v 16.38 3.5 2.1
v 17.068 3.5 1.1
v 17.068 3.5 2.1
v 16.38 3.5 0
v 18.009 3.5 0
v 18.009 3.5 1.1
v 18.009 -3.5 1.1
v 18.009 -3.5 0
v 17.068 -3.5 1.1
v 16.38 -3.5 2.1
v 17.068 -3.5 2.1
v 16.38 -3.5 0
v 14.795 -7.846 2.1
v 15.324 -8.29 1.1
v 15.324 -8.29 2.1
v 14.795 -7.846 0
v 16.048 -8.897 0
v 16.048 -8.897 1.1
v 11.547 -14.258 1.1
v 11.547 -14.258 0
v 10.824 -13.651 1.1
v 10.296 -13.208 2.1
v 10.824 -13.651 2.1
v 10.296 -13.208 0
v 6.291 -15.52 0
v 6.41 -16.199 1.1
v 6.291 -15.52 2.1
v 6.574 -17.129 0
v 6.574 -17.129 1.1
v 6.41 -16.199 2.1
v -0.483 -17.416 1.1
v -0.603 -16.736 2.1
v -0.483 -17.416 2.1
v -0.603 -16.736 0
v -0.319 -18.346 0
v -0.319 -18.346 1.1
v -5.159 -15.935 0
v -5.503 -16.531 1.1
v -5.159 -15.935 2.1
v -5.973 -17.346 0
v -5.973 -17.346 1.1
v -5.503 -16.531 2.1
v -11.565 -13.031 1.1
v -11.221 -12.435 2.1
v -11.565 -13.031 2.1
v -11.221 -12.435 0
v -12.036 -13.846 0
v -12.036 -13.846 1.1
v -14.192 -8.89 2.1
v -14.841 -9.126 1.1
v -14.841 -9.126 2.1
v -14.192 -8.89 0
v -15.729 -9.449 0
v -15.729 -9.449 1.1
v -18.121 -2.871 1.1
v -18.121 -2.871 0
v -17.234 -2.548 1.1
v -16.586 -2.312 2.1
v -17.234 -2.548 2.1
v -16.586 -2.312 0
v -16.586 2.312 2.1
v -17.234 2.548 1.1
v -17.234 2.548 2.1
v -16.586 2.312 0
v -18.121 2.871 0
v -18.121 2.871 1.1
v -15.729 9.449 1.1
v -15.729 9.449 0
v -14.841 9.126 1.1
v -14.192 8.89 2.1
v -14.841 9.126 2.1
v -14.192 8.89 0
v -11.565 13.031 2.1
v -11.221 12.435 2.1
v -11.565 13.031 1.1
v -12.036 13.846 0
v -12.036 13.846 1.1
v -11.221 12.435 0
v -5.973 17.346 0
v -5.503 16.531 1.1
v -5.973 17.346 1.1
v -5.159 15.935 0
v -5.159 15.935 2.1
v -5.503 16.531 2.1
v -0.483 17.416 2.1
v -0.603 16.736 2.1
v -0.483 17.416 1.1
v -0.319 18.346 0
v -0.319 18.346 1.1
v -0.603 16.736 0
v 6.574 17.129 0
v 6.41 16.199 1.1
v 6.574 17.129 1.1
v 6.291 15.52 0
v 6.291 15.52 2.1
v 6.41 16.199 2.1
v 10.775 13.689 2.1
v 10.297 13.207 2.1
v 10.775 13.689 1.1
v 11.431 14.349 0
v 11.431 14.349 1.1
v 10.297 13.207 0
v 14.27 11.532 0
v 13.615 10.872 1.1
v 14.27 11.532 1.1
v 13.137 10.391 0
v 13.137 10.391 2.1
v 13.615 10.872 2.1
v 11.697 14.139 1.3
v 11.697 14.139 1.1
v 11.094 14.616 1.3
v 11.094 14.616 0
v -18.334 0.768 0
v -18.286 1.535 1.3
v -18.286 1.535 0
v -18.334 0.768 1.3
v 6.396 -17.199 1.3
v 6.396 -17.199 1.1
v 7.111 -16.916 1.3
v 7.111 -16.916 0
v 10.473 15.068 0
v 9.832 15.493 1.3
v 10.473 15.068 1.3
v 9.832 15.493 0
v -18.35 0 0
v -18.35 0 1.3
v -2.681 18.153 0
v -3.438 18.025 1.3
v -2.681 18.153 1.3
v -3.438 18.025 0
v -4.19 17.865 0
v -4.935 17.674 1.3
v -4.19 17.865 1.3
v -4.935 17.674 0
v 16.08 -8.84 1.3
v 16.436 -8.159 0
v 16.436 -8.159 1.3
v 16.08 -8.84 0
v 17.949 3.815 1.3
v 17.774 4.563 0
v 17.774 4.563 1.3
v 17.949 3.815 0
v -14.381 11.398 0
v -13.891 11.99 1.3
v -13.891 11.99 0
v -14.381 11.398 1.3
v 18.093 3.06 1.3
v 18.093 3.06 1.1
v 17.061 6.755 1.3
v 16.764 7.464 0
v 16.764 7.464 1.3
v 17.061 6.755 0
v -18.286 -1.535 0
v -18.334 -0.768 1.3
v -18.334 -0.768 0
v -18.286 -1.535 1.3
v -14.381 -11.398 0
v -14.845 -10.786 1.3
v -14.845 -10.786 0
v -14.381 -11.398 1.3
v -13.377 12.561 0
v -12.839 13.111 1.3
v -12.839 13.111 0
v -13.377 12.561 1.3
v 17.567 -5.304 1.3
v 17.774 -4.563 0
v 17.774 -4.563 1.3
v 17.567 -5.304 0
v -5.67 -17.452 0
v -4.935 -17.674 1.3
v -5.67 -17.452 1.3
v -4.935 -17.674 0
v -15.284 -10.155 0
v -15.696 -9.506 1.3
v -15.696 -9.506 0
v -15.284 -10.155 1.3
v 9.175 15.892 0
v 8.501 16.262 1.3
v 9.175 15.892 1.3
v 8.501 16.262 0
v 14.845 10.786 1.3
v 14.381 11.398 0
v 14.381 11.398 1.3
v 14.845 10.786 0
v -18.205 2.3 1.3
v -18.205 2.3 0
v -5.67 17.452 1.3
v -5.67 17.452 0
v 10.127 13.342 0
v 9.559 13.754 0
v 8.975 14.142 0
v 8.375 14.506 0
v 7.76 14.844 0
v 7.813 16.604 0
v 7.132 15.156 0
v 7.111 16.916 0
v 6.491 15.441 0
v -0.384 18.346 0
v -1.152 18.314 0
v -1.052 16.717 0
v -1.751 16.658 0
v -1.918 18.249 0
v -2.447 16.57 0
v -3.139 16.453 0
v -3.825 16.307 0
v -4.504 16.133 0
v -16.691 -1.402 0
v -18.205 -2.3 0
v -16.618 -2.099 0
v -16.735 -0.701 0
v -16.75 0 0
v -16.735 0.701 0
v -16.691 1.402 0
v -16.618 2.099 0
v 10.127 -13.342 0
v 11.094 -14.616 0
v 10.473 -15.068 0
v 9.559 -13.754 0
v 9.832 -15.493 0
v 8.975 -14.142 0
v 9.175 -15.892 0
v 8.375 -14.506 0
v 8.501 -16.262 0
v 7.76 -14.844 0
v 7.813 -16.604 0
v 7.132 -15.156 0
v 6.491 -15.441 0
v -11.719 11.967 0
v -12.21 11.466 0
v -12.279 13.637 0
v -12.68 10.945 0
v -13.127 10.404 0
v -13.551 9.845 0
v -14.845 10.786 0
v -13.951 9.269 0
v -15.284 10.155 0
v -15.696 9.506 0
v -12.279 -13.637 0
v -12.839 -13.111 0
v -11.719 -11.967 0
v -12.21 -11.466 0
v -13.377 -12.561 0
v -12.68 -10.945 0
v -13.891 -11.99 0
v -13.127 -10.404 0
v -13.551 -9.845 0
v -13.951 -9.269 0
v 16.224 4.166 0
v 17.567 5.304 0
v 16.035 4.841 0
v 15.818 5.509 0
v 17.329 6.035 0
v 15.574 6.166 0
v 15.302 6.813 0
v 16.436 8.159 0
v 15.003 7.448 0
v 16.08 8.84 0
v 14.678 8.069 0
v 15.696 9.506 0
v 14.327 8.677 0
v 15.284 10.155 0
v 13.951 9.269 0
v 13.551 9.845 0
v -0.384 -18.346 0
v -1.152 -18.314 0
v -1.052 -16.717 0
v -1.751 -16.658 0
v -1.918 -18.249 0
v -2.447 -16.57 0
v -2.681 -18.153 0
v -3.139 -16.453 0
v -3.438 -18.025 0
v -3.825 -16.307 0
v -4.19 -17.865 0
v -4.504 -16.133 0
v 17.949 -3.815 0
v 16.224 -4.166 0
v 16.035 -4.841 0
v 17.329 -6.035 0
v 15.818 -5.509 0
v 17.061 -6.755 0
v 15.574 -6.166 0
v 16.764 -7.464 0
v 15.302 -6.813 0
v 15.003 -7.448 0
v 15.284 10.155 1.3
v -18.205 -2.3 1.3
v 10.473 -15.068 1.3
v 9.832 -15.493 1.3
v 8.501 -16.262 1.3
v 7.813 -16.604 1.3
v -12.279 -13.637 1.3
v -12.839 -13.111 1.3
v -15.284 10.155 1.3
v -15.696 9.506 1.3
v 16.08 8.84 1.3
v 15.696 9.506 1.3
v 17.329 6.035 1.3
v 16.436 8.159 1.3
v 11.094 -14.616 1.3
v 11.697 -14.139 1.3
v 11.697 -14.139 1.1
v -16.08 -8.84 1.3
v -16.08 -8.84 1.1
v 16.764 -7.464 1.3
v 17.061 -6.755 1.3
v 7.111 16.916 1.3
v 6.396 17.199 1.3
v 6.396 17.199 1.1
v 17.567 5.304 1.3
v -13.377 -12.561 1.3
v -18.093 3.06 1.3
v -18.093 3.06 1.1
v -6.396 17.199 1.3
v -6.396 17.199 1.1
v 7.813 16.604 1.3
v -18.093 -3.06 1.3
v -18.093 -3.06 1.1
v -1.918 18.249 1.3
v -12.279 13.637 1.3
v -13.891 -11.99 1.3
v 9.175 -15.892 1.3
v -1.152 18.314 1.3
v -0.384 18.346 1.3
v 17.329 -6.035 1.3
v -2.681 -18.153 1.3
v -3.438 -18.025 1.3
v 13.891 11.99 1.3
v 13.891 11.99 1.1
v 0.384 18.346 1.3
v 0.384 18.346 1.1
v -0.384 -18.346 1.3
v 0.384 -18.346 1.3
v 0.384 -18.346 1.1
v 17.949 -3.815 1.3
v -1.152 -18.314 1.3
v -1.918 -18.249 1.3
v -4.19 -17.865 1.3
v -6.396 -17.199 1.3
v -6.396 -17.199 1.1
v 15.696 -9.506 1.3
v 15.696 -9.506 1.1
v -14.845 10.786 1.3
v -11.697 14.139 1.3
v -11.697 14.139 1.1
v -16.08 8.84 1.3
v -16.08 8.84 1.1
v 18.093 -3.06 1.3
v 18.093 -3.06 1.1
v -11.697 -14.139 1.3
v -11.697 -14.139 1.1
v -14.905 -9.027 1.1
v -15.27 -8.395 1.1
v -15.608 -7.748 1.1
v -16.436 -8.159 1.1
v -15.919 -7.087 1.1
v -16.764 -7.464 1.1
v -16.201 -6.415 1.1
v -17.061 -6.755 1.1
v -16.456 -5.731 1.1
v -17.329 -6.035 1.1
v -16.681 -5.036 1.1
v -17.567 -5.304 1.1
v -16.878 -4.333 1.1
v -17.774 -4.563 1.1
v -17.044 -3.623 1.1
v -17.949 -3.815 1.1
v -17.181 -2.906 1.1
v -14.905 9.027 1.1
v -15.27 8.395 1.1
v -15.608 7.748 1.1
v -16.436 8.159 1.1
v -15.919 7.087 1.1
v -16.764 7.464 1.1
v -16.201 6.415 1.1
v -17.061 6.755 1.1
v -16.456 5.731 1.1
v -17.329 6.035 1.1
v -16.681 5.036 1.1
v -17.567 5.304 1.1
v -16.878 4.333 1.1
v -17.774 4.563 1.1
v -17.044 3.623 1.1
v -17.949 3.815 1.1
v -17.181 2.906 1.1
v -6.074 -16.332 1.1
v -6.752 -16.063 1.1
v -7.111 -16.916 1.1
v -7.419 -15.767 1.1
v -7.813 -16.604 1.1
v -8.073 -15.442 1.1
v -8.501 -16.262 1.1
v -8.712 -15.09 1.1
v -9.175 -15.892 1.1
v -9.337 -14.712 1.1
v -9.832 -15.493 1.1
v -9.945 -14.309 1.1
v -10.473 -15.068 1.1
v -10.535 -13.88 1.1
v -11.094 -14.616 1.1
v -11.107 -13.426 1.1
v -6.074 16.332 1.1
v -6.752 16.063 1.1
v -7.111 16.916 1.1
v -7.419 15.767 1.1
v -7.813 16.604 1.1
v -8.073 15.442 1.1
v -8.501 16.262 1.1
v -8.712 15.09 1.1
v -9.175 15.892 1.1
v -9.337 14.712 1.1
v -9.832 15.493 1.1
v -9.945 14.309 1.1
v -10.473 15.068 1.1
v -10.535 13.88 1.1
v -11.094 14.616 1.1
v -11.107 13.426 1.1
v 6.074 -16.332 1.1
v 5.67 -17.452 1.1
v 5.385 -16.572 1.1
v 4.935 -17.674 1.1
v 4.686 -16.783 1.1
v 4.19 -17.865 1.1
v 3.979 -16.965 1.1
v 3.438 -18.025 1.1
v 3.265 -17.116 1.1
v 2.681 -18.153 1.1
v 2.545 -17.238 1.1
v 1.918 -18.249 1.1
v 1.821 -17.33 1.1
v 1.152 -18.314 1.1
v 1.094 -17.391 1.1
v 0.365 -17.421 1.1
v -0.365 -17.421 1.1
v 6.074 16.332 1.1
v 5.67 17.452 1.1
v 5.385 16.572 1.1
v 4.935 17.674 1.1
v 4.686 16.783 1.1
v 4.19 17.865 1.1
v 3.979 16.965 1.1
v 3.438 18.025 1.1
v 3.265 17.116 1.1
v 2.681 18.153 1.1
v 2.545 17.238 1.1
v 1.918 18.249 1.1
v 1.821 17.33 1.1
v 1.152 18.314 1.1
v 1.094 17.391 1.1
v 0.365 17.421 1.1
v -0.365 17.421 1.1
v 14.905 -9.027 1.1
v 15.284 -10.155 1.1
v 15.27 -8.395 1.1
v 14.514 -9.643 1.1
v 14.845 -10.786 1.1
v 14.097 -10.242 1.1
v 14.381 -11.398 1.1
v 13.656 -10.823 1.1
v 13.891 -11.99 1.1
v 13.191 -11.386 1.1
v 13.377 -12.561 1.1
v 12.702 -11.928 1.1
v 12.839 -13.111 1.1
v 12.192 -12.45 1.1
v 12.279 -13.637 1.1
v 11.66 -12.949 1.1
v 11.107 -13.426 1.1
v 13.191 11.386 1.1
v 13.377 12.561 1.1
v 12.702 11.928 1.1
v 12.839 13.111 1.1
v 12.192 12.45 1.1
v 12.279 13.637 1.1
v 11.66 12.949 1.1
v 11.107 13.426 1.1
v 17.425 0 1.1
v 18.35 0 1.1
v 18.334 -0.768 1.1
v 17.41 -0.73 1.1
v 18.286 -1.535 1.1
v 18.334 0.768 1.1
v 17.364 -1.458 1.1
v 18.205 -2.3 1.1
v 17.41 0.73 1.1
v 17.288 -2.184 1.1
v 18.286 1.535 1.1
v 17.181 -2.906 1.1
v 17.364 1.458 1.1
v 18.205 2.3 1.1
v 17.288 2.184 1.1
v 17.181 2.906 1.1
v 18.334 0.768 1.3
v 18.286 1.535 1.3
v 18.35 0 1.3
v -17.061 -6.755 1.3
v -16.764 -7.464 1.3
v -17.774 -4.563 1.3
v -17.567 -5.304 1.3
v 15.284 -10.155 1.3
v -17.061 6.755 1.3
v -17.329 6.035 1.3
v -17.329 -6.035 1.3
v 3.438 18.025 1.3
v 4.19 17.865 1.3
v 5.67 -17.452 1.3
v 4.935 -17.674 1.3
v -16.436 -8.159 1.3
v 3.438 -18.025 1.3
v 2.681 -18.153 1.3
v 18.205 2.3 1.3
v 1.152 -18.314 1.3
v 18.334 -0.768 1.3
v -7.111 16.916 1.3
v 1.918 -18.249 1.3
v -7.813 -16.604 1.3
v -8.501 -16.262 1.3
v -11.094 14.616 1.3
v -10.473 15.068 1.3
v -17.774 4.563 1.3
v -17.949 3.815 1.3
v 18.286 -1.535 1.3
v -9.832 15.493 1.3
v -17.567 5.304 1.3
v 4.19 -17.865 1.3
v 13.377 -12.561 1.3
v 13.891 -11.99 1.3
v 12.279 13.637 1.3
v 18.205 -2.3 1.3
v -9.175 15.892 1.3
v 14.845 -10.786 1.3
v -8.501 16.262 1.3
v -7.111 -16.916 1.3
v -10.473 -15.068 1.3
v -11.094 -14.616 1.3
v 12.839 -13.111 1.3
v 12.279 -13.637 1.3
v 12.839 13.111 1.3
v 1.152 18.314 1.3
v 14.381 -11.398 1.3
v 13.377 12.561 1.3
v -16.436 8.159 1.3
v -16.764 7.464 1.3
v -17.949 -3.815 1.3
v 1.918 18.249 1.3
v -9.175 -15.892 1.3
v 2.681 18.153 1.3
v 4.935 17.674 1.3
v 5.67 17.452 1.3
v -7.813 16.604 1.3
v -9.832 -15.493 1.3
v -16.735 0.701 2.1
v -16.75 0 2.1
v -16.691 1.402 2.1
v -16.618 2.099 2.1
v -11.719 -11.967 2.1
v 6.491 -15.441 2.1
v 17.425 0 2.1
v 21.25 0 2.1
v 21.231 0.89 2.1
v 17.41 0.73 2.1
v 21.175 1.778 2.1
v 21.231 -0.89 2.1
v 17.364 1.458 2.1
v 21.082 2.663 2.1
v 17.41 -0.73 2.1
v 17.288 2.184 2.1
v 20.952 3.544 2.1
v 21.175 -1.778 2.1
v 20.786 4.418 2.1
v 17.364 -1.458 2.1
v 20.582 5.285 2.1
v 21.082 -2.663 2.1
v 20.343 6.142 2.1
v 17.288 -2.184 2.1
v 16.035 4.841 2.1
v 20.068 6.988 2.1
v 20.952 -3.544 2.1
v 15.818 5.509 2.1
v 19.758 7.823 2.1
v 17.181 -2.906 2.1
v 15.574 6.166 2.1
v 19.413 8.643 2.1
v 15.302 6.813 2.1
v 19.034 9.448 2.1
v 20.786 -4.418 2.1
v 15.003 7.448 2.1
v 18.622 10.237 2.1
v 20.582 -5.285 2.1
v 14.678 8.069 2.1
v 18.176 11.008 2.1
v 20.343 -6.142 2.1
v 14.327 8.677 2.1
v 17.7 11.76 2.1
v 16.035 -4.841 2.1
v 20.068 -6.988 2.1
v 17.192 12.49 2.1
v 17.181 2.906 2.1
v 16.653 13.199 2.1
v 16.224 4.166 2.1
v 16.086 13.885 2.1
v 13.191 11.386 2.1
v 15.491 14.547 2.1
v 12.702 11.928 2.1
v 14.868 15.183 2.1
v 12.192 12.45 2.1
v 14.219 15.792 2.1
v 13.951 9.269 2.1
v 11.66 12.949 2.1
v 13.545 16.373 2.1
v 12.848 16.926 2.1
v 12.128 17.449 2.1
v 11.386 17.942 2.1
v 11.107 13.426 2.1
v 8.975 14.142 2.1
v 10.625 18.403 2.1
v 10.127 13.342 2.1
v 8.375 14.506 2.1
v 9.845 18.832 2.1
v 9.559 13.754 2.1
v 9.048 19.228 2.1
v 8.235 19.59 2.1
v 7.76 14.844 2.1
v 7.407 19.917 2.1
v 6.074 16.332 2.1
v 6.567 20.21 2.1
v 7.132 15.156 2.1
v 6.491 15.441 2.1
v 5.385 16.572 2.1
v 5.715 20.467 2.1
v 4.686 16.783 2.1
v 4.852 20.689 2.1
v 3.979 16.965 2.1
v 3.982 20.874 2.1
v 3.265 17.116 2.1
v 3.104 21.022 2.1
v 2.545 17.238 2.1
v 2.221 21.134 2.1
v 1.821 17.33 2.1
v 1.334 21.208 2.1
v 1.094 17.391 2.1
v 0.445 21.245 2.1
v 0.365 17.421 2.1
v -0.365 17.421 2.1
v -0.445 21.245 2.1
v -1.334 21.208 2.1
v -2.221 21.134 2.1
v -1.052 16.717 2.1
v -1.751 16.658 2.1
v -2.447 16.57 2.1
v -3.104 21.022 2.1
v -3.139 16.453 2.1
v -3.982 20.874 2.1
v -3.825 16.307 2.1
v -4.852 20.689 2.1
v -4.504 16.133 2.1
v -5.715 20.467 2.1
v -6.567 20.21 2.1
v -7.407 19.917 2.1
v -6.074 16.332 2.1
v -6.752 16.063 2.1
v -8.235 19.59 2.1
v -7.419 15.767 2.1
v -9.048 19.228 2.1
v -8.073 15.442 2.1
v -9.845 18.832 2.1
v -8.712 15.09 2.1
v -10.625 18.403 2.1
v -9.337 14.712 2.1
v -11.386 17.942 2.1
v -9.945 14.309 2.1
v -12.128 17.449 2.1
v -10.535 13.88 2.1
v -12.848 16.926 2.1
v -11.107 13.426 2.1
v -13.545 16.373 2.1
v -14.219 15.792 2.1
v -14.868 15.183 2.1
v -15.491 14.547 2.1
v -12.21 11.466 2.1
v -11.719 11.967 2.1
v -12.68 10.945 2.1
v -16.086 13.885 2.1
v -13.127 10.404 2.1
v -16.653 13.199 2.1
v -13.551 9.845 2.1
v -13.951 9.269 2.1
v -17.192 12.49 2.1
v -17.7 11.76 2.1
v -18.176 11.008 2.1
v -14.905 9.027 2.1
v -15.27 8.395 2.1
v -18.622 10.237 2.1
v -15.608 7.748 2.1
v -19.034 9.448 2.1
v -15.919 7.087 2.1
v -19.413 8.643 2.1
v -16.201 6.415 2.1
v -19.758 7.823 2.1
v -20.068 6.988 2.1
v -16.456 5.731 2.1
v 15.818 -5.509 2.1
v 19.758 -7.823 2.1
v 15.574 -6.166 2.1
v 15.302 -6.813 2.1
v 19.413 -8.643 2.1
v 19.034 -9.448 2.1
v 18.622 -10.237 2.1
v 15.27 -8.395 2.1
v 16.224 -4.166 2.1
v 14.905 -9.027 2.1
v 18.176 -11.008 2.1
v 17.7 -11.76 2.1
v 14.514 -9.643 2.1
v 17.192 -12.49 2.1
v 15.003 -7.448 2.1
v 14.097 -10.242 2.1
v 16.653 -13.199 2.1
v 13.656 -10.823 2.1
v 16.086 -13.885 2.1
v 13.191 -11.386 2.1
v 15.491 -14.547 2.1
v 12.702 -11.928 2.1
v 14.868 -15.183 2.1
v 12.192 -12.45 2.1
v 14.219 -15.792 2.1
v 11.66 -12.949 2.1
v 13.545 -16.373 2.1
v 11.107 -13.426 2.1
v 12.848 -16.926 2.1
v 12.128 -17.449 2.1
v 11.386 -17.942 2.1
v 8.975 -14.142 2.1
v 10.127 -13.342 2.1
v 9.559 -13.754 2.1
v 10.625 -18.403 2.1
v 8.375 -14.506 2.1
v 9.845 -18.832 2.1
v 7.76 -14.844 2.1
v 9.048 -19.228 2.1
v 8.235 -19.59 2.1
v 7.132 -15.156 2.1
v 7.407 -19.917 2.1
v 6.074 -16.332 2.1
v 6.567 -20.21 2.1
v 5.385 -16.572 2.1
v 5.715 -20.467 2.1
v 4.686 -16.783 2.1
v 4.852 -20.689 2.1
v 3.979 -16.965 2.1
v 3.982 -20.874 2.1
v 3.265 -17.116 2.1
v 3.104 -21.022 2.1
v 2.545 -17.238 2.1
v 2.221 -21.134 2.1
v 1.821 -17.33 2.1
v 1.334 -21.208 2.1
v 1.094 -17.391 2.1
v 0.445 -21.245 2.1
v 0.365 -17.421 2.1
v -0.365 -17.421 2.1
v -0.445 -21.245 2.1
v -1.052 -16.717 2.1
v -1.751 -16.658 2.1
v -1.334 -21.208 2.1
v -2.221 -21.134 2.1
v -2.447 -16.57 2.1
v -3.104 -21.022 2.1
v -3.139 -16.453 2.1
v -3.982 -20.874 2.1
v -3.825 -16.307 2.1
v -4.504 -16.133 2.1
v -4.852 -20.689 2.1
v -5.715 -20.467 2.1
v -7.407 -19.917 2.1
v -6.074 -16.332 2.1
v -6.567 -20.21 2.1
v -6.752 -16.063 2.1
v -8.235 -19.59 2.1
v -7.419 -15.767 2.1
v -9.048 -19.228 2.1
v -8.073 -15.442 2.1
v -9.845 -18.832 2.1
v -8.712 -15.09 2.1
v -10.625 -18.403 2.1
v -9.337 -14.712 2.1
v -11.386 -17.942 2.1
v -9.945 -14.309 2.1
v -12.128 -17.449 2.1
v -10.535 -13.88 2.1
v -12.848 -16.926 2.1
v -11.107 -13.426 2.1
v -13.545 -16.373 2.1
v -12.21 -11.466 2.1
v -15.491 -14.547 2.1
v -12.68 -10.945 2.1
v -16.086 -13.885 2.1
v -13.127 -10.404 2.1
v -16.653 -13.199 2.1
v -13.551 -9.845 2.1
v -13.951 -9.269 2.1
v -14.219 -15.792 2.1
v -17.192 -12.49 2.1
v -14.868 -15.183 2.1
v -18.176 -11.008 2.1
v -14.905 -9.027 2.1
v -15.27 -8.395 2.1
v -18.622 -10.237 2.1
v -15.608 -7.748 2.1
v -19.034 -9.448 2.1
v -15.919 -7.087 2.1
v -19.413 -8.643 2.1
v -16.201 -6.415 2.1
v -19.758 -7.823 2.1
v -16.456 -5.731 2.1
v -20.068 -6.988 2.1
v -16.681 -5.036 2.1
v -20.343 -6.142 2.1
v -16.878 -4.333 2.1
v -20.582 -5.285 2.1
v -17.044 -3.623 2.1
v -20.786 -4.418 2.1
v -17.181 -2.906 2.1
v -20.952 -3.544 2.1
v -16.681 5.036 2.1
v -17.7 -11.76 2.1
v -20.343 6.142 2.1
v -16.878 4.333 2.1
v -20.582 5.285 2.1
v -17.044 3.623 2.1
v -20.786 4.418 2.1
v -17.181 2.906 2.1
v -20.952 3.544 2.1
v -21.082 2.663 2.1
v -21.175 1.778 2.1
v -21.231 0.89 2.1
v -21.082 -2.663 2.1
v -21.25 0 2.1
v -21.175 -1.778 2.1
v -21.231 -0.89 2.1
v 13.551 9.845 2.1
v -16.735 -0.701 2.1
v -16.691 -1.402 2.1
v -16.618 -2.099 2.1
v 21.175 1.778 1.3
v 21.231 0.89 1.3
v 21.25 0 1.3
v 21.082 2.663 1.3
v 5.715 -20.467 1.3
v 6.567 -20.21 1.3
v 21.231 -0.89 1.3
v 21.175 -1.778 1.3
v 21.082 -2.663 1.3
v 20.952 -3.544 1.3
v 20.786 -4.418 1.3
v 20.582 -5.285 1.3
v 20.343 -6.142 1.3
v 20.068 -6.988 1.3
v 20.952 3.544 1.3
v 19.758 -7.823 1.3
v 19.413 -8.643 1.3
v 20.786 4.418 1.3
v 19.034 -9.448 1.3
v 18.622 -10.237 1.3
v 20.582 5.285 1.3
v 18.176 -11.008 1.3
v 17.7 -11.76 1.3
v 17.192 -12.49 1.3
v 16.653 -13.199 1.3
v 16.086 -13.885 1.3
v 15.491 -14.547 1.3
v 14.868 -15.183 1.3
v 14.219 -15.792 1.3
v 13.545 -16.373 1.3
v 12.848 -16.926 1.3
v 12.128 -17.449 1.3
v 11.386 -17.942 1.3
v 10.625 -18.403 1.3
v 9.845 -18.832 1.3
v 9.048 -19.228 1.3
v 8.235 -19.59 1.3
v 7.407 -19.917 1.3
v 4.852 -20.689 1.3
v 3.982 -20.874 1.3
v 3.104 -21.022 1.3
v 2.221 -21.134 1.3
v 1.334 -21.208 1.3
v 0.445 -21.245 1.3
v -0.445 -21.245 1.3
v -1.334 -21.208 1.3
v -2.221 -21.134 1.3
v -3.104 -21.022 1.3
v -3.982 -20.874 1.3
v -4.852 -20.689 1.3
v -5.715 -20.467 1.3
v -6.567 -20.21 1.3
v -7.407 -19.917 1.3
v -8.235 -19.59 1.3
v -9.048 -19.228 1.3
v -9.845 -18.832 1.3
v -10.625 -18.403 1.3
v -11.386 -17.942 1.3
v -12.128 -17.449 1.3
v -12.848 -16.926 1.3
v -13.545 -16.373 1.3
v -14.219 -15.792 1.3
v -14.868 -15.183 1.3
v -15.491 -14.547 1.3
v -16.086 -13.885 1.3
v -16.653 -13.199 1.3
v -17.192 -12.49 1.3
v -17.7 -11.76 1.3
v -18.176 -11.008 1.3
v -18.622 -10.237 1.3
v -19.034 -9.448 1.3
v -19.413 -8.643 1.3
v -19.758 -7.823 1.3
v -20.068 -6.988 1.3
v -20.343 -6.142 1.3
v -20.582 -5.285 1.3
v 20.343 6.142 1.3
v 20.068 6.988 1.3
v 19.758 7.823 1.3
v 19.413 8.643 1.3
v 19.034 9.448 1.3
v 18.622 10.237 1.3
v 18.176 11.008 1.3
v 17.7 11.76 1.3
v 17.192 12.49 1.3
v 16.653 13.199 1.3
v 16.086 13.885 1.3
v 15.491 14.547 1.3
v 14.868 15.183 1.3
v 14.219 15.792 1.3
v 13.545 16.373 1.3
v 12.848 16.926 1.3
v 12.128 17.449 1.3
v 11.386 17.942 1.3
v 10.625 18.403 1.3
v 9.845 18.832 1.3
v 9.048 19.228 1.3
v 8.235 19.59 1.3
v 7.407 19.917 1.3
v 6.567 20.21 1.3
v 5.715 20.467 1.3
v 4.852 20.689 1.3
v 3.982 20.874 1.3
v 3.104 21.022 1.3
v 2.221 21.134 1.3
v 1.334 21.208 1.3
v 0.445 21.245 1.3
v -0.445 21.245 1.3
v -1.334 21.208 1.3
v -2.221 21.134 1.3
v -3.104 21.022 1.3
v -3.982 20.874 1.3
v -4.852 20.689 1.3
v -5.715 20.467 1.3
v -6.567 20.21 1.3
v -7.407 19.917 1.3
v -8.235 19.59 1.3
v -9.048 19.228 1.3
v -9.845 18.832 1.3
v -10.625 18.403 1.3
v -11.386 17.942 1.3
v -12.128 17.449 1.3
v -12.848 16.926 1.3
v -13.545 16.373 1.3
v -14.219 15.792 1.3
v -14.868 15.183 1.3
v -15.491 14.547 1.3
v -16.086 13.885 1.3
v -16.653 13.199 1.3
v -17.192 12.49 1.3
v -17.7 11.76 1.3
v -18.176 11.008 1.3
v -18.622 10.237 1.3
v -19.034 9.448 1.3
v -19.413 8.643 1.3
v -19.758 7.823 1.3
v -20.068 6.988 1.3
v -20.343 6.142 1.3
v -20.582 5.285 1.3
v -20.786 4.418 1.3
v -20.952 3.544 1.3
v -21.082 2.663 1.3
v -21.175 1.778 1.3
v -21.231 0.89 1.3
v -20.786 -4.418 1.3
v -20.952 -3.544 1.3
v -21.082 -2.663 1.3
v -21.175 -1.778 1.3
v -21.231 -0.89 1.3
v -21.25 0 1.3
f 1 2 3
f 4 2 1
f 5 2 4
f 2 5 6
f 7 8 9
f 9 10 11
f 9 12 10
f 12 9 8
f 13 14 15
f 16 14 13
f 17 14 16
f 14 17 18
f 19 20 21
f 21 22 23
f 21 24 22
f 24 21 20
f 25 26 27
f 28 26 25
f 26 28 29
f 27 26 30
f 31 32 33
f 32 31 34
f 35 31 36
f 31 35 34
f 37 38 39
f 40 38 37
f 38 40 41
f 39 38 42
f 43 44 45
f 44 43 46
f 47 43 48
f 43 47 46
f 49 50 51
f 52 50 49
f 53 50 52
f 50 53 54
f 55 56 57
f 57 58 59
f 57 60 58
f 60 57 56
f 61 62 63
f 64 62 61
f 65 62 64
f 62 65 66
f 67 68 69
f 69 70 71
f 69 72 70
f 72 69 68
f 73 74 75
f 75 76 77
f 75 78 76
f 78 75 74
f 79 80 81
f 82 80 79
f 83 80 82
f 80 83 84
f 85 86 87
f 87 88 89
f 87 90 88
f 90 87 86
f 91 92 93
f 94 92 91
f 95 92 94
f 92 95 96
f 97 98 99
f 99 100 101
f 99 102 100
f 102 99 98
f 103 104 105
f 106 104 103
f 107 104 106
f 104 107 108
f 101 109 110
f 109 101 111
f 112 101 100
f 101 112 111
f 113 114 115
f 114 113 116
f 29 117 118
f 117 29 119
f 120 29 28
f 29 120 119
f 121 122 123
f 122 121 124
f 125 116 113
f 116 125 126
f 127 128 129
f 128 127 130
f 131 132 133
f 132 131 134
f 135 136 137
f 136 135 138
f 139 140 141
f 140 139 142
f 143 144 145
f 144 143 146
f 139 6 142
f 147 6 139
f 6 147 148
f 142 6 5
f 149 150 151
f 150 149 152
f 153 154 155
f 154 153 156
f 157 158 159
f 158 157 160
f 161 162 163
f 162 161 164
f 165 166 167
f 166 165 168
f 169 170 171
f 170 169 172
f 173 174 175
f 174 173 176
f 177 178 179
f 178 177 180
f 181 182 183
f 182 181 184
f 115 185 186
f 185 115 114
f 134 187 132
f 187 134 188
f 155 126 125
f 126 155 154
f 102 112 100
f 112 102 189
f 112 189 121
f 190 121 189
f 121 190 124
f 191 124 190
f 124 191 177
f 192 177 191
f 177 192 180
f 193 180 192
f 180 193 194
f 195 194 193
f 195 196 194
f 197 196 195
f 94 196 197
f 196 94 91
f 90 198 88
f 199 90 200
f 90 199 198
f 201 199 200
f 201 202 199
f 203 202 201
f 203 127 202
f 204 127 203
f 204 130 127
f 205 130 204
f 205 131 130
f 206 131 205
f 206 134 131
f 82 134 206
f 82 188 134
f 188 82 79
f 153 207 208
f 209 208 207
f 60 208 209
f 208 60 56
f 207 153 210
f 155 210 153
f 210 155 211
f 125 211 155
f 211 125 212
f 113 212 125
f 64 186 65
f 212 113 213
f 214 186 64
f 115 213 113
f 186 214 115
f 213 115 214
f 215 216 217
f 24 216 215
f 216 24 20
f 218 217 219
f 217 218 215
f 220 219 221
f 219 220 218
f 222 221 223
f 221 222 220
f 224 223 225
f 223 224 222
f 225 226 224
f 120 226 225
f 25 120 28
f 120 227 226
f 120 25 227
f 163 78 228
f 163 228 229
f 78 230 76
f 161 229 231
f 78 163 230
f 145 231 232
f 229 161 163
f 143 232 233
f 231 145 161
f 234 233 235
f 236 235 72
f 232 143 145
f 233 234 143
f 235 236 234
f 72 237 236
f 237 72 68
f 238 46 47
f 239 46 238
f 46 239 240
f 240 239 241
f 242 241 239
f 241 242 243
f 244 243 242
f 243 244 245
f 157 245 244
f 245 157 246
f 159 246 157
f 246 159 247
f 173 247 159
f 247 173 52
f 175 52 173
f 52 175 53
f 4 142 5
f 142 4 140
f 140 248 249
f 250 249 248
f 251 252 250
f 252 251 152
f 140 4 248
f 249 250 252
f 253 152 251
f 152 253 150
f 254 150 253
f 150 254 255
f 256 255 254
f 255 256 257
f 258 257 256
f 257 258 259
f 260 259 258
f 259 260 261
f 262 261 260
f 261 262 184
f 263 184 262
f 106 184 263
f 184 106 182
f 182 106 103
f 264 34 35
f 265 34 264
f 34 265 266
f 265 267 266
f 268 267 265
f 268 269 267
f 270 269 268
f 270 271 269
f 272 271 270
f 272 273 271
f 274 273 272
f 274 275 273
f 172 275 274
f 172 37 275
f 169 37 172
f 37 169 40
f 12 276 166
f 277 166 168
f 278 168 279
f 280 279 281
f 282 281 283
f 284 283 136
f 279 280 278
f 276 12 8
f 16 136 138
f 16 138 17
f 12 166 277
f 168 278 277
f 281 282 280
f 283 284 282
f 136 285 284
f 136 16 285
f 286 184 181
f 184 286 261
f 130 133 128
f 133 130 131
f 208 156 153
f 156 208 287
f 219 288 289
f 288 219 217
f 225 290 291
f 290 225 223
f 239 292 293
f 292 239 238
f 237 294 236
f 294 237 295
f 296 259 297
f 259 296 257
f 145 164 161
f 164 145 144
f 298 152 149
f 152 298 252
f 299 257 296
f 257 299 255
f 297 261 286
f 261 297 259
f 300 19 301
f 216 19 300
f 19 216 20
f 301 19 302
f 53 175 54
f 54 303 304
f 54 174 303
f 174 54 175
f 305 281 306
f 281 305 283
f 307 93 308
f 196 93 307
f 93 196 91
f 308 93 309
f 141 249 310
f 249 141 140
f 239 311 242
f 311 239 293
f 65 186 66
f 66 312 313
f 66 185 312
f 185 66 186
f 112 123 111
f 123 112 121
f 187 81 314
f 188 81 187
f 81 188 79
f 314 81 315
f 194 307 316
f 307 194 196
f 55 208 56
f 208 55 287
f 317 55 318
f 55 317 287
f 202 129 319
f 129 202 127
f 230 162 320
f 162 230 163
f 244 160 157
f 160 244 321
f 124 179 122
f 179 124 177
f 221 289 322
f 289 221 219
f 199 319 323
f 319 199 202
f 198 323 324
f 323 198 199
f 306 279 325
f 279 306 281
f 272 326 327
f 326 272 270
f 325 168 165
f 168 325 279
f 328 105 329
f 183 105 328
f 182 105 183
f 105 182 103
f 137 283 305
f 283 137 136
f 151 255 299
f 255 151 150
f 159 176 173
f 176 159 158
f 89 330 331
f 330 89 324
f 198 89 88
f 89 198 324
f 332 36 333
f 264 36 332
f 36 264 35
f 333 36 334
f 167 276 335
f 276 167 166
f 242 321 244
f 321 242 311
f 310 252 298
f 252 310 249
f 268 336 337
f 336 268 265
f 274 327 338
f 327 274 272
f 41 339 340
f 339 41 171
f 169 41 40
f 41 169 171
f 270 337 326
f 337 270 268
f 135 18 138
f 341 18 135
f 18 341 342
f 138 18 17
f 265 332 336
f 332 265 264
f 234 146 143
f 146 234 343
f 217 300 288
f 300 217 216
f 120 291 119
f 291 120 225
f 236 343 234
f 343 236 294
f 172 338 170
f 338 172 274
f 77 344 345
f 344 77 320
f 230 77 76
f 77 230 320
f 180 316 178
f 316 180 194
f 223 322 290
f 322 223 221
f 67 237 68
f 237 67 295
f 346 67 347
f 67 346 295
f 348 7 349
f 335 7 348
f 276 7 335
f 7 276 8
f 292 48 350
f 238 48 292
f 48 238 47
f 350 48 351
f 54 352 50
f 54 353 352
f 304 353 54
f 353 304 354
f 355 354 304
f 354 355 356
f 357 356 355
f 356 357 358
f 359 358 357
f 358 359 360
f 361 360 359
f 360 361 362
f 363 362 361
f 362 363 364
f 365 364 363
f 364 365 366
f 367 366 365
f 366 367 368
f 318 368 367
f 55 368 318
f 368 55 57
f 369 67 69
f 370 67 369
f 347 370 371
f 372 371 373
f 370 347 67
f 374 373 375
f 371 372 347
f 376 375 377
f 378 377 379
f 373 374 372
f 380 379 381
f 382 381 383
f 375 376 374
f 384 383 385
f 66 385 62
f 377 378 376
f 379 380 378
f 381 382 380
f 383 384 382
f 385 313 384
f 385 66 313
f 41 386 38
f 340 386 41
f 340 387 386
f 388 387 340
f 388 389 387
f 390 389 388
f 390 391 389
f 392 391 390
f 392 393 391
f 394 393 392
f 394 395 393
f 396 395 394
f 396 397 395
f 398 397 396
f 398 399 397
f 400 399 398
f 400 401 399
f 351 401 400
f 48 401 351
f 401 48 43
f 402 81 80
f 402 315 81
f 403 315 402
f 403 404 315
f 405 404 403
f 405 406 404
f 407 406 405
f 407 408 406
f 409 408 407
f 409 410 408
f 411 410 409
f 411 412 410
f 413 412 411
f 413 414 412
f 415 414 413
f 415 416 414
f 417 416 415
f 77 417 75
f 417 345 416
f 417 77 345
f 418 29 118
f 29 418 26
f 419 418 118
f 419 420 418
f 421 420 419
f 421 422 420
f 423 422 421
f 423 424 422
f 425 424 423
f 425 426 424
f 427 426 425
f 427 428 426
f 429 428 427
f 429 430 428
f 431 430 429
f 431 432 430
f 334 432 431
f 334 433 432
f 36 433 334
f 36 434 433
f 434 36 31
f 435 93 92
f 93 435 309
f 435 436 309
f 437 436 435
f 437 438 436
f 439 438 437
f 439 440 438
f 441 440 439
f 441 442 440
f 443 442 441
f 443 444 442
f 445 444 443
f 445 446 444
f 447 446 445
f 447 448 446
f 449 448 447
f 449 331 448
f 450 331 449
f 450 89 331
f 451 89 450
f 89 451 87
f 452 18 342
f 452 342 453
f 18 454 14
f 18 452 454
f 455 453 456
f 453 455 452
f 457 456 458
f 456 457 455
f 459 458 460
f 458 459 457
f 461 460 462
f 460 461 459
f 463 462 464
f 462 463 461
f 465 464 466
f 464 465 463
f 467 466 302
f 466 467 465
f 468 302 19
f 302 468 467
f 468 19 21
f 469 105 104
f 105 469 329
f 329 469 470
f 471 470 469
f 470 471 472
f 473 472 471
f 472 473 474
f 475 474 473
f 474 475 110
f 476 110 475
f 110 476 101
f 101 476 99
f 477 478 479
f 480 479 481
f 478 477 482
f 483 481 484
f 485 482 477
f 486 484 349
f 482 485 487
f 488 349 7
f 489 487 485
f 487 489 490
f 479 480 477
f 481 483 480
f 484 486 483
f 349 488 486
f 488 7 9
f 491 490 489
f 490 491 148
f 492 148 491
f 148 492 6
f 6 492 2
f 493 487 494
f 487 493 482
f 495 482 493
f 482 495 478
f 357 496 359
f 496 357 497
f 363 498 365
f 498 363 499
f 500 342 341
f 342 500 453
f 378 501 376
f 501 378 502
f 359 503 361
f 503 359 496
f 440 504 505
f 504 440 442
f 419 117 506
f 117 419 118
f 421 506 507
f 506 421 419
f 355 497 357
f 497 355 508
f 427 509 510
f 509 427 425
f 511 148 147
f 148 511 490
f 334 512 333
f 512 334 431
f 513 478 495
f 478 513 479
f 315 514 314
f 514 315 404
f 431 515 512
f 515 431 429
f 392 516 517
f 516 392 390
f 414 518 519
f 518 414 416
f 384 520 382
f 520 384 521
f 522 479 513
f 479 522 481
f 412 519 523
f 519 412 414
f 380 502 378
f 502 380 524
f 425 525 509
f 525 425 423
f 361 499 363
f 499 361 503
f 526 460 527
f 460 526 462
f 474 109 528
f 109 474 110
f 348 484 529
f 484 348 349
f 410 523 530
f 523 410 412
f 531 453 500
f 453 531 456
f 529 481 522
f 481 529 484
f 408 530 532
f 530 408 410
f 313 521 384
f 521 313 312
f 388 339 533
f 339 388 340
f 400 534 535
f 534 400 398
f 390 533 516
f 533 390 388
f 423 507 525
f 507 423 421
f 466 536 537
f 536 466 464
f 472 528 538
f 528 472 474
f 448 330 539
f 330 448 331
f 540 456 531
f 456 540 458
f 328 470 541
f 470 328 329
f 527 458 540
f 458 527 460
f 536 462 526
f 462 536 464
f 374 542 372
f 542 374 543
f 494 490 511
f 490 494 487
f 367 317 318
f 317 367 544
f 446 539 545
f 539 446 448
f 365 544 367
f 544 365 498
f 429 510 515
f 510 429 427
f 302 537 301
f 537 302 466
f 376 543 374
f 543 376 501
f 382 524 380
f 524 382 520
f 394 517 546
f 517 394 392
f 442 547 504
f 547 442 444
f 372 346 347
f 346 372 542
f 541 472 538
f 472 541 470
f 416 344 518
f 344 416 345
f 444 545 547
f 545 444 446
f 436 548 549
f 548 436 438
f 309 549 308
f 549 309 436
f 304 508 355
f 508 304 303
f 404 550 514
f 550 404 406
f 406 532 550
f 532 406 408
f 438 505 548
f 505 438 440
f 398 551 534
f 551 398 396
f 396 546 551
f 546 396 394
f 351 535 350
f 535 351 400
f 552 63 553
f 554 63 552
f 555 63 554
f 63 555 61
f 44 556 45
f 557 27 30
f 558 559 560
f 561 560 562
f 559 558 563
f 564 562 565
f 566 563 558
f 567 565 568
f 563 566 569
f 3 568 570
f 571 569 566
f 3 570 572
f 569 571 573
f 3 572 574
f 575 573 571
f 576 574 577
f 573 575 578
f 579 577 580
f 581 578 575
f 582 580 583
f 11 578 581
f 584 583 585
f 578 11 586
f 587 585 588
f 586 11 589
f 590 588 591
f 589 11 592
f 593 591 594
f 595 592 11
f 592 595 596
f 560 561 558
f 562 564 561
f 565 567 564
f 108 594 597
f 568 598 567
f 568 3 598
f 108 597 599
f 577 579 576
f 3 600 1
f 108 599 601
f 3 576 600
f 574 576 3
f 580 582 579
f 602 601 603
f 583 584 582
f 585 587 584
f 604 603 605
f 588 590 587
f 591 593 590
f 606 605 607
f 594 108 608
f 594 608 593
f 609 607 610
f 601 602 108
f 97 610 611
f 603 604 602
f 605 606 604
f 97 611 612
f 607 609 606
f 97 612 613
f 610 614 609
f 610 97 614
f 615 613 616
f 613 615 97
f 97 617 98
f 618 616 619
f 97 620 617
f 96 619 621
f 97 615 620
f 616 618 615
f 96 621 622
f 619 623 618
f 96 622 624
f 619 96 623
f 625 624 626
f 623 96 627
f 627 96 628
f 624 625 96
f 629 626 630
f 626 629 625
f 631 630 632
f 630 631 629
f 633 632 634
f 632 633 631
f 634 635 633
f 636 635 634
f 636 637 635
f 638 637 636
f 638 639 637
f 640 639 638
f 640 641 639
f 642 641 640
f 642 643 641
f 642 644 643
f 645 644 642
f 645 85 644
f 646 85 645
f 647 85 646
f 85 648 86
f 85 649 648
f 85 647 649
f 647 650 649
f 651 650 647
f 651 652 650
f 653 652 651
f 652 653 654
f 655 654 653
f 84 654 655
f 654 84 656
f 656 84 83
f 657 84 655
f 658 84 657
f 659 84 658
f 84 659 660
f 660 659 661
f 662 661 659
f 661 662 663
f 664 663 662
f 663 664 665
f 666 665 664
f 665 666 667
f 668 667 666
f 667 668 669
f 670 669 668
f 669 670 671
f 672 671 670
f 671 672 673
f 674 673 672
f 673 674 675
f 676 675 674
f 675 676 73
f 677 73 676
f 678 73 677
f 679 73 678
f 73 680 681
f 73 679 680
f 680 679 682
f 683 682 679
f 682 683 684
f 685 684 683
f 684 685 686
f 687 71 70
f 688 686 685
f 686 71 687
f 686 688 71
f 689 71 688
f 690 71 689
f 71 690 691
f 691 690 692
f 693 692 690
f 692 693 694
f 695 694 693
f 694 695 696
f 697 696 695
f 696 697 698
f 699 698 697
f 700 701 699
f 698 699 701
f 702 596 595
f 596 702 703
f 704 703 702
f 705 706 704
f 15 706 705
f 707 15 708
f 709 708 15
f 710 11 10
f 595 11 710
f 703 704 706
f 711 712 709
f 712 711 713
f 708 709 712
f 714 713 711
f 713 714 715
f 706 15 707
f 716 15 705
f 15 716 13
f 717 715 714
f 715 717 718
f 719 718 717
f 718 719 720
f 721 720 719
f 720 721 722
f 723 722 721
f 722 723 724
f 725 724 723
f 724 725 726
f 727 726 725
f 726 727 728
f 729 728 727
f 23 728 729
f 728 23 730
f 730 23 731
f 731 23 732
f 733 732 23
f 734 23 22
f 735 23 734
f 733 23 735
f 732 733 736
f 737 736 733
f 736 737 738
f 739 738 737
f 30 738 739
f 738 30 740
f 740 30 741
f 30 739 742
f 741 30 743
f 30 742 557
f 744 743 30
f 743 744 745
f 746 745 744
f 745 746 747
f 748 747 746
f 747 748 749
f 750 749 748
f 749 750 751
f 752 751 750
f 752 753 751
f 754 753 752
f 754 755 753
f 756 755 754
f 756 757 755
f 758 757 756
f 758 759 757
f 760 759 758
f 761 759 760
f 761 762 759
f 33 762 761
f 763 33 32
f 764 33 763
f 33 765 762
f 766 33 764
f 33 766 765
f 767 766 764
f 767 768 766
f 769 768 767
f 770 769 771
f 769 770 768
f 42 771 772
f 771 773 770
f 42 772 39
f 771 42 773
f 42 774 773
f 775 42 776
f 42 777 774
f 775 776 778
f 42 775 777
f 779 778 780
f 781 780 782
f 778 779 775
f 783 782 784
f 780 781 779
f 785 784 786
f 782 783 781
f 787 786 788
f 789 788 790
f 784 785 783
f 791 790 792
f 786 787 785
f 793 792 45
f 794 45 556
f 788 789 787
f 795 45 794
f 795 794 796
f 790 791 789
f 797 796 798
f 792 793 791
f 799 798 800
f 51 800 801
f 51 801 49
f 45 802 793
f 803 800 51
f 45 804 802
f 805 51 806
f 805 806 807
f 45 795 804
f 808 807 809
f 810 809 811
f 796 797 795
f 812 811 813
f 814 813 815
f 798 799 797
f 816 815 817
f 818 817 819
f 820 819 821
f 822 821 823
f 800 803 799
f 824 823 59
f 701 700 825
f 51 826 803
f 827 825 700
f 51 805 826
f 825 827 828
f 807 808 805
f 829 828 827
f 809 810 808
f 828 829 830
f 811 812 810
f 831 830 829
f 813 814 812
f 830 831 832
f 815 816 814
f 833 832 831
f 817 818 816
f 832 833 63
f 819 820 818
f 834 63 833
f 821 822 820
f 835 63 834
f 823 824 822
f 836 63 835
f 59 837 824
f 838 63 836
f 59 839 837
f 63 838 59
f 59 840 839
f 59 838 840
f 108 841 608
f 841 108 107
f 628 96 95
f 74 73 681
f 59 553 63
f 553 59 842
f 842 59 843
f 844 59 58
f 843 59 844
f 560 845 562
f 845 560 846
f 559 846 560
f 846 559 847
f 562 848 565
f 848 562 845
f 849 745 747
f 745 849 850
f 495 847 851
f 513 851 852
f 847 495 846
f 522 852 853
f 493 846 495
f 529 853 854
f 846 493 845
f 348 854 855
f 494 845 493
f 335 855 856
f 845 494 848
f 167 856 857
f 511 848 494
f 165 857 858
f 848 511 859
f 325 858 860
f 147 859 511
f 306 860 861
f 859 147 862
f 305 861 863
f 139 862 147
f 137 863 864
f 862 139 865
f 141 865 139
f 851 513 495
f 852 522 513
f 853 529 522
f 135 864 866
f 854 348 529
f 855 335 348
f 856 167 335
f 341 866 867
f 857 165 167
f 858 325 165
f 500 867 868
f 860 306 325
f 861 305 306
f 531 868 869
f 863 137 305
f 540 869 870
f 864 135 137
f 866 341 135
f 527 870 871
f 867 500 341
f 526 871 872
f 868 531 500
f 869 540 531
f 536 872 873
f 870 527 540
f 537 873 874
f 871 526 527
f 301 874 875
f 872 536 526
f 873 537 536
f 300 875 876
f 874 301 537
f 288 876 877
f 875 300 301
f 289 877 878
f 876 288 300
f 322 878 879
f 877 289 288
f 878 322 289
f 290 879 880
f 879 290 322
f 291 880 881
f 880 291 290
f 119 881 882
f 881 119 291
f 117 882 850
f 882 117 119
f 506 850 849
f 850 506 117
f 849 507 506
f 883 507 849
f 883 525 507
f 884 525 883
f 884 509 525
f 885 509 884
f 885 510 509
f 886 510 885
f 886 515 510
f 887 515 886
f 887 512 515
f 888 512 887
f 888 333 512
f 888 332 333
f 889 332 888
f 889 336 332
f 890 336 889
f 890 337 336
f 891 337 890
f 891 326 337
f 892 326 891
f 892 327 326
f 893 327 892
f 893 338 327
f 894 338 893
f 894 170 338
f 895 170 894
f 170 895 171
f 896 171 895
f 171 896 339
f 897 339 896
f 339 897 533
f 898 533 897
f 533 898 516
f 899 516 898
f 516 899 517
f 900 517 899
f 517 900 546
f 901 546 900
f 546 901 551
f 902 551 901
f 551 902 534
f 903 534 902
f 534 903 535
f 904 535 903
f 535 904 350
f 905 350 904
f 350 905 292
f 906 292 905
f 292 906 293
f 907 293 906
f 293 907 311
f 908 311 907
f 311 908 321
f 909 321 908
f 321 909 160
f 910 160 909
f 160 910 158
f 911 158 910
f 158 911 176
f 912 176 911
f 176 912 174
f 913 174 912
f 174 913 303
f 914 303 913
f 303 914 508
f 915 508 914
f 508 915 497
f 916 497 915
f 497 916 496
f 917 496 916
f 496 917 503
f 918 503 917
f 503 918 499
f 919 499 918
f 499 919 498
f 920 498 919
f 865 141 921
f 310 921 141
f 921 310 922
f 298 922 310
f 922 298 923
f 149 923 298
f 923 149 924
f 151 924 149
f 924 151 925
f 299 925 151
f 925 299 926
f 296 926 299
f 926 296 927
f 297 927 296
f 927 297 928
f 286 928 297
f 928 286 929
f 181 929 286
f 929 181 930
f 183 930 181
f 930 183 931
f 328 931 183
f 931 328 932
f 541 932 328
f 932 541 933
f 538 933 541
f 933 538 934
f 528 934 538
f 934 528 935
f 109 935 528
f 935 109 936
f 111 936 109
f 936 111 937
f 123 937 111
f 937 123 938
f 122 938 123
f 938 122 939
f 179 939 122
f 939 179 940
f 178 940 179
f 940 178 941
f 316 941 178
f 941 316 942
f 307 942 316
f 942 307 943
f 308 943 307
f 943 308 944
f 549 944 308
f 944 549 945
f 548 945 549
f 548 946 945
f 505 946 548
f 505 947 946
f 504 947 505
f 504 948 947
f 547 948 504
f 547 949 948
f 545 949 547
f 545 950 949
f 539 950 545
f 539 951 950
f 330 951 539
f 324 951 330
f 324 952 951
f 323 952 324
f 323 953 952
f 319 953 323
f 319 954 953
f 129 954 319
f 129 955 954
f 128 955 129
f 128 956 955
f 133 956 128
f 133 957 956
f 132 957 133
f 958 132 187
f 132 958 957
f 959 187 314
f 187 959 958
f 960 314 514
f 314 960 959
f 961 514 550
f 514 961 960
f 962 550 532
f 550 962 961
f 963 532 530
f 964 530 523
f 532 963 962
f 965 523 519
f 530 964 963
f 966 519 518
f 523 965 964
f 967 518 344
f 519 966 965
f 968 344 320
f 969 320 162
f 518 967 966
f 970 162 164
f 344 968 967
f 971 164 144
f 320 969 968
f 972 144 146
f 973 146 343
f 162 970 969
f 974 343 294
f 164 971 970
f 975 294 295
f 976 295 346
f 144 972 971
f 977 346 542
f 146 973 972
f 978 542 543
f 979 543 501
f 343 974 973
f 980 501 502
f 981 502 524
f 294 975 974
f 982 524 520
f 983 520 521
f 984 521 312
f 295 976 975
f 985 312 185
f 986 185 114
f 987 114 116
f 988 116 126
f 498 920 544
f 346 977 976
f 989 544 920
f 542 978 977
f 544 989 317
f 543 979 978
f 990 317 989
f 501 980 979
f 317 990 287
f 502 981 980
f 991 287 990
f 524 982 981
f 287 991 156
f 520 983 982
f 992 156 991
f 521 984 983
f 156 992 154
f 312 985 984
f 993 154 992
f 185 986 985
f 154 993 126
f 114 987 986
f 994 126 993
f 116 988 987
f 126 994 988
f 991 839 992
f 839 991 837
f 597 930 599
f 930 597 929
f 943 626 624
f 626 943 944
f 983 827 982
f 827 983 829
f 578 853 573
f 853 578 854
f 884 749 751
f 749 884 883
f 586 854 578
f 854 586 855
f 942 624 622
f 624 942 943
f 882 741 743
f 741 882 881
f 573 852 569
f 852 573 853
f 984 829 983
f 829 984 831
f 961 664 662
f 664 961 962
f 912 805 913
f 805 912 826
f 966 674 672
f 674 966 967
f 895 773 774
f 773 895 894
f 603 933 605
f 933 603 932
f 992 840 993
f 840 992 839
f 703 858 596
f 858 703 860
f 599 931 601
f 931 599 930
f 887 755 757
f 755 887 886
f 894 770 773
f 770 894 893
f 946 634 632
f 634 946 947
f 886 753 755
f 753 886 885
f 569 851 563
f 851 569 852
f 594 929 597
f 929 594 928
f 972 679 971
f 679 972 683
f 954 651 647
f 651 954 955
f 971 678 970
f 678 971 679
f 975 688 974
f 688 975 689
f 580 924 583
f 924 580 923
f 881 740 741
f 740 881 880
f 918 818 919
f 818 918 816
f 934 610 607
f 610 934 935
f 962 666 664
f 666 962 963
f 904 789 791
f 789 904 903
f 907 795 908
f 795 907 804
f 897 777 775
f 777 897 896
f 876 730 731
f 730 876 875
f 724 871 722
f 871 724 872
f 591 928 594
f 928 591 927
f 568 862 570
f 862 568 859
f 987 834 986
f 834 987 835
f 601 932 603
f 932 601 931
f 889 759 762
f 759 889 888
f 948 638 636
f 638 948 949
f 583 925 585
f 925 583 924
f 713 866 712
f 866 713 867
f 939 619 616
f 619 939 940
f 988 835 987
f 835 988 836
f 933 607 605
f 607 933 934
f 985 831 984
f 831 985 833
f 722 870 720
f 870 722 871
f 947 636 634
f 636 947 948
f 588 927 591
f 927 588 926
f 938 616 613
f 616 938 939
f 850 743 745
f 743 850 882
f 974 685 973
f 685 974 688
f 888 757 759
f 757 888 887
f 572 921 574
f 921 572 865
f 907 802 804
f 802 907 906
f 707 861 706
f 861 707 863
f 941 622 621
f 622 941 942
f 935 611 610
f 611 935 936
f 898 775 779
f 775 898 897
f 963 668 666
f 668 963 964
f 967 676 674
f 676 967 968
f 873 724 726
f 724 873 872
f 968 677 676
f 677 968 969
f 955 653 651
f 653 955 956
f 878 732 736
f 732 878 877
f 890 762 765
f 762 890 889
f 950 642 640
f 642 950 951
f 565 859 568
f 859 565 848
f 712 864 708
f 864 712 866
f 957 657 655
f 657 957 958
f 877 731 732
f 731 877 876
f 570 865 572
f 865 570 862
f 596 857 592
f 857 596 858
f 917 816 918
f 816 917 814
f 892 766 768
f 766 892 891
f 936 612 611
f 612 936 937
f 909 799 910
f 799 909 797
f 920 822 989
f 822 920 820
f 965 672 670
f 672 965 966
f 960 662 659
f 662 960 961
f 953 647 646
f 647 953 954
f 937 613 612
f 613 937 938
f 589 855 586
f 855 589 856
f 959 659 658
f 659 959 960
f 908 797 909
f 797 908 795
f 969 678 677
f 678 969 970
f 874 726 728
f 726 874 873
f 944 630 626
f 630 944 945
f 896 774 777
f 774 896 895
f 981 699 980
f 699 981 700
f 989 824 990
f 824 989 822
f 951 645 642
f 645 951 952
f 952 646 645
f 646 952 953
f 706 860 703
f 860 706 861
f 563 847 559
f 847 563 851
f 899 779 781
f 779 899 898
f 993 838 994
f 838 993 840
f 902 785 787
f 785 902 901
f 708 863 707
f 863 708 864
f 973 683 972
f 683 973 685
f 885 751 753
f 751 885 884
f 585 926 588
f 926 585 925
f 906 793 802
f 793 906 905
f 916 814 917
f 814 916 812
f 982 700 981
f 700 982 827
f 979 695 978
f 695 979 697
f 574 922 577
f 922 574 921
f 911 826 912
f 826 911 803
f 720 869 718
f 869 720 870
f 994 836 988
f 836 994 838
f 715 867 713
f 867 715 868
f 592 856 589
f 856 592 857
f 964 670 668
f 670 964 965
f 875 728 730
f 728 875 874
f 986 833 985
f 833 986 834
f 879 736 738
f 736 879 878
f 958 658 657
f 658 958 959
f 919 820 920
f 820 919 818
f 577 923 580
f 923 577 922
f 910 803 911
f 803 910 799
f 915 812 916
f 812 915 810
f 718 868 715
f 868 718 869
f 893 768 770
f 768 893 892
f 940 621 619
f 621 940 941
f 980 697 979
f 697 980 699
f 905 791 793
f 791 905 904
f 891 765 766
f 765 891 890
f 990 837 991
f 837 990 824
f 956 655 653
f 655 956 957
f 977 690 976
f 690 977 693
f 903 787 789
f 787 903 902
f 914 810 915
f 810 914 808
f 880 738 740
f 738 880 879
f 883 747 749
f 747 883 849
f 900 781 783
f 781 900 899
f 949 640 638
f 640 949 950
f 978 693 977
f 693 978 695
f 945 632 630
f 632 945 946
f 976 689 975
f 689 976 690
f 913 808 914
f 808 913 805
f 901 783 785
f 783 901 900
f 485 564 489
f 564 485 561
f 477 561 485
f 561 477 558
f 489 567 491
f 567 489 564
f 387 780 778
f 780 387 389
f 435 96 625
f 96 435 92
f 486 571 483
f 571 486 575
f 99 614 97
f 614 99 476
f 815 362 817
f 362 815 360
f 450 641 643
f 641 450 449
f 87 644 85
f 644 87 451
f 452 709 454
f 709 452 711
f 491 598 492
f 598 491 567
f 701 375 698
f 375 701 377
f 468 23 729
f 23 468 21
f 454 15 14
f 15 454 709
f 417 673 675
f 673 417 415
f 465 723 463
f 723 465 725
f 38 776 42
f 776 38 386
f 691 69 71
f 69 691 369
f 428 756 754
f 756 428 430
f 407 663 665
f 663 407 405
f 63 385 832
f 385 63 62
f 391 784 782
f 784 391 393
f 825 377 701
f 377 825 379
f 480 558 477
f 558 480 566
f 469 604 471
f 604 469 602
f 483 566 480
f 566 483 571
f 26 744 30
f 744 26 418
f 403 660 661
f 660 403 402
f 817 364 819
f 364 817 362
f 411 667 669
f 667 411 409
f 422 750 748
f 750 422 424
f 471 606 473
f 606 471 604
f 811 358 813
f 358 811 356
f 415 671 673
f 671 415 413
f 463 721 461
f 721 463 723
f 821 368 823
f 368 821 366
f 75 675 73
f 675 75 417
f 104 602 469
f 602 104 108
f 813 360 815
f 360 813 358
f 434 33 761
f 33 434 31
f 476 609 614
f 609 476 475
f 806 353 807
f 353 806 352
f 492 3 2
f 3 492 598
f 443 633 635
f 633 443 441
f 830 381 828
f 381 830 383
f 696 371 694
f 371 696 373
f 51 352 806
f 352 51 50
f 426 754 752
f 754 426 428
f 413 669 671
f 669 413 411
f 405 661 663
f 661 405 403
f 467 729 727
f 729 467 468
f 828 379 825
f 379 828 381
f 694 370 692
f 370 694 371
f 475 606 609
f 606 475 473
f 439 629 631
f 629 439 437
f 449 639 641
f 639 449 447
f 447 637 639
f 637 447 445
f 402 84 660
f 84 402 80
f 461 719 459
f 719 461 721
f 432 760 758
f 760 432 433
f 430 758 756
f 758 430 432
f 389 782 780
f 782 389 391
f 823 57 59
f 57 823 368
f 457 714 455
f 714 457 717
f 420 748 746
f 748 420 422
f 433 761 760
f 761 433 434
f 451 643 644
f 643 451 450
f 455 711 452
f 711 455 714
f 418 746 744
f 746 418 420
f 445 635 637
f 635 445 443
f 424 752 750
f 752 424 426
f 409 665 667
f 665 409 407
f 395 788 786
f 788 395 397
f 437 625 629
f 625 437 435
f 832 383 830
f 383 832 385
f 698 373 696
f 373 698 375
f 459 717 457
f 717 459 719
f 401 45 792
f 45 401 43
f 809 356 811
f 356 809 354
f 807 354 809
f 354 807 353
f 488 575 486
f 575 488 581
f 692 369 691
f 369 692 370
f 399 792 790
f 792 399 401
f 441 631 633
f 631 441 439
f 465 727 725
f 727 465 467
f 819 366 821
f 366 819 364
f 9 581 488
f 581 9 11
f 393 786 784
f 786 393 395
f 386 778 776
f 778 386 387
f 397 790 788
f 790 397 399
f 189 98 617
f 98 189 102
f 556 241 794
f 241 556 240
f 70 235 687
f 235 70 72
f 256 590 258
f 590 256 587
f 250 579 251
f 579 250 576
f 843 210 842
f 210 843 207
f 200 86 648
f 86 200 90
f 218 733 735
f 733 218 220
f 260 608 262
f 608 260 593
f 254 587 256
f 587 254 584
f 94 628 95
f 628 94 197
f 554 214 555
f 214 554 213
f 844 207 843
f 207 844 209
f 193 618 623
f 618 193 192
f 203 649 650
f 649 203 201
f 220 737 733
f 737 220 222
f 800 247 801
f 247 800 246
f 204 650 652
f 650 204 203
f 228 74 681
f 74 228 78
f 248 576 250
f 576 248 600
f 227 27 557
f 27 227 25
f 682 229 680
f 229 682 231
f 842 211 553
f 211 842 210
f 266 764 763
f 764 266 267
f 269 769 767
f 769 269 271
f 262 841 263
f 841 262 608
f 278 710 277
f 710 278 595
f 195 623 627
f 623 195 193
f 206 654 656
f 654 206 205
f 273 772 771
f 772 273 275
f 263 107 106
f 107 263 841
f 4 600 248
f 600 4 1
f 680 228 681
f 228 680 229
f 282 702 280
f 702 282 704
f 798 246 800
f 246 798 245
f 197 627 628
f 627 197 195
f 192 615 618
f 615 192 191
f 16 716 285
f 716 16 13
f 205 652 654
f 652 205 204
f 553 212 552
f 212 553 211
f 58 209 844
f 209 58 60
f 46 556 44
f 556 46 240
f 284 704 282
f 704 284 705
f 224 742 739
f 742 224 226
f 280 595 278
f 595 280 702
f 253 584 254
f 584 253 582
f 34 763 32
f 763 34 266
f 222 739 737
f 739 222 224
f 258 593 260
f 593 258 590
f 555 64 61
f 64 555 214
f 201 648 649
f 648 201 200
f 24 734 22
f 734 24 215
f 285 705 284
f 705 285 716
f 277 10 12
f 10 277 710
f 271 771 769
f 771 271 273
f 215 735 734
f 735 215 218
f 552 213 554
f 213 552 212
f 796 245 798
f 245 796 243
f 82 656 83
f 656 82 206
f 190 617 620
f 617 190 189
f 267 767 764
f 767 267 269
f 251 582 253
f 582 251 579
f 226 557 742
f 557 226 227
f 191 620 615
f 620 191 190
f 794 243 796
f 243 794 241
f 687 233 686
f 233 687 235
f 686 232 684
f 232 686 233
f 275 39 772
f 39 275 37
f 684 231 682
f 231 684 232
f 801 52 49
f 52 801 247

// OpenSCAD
$fn=150;

module hub_teeth()
{
	rotate([0,0,-360/9*0]) translate([16,0,3]) cube([6,7,8], center=true);
	rotate([0,0,-360/9*1]) translate([16,0,3]) cube([6,7,8], center=true);
	rotate([0,0,-360/9*2]) translate([16,0,3]) cube([6,7,8], center=true);
	rotate([0,0,-360/9*3]) translate([16,0,3]) cube([6,7,8], center=true);
	rotate([0,0,-360/9*4]) translate([16,0,3]) cube([6,7,8], center=true);
	rotate([0,0,-360/9*5]) translate([16,0,3]) cube([6,7,8], center=true);
	rotate([0,0,-360/9*6]) translate([16,0,3]) cube([6,7,8], center=true);
	rotate([0,0,-360/9*7]) translate([16,0,3]) cube([6,7,8], center=true);
	rotate([0,0,-360/9*7.87]) translate([17,0,3]) cube([6,4,8], center=true);
}

difference()
{
	union()
	{
		difference()
		{
			cylinder(h=1.1,d=36.7);
			hub_teeth();
		}
		translate([0,0,1.1]) cylinder(h=1,d=36.7);
		translate([0,0,1.3]) cylinder(h=0.8, d=42.5);
	}
	intersection()
	{
		translate([0,0,-0.1]) cylinder(h=3,d=34.85);
		hub_teeth();
	}
	translate([0,0,-0.1]) cylinder(h=3,d=33.5);
}
